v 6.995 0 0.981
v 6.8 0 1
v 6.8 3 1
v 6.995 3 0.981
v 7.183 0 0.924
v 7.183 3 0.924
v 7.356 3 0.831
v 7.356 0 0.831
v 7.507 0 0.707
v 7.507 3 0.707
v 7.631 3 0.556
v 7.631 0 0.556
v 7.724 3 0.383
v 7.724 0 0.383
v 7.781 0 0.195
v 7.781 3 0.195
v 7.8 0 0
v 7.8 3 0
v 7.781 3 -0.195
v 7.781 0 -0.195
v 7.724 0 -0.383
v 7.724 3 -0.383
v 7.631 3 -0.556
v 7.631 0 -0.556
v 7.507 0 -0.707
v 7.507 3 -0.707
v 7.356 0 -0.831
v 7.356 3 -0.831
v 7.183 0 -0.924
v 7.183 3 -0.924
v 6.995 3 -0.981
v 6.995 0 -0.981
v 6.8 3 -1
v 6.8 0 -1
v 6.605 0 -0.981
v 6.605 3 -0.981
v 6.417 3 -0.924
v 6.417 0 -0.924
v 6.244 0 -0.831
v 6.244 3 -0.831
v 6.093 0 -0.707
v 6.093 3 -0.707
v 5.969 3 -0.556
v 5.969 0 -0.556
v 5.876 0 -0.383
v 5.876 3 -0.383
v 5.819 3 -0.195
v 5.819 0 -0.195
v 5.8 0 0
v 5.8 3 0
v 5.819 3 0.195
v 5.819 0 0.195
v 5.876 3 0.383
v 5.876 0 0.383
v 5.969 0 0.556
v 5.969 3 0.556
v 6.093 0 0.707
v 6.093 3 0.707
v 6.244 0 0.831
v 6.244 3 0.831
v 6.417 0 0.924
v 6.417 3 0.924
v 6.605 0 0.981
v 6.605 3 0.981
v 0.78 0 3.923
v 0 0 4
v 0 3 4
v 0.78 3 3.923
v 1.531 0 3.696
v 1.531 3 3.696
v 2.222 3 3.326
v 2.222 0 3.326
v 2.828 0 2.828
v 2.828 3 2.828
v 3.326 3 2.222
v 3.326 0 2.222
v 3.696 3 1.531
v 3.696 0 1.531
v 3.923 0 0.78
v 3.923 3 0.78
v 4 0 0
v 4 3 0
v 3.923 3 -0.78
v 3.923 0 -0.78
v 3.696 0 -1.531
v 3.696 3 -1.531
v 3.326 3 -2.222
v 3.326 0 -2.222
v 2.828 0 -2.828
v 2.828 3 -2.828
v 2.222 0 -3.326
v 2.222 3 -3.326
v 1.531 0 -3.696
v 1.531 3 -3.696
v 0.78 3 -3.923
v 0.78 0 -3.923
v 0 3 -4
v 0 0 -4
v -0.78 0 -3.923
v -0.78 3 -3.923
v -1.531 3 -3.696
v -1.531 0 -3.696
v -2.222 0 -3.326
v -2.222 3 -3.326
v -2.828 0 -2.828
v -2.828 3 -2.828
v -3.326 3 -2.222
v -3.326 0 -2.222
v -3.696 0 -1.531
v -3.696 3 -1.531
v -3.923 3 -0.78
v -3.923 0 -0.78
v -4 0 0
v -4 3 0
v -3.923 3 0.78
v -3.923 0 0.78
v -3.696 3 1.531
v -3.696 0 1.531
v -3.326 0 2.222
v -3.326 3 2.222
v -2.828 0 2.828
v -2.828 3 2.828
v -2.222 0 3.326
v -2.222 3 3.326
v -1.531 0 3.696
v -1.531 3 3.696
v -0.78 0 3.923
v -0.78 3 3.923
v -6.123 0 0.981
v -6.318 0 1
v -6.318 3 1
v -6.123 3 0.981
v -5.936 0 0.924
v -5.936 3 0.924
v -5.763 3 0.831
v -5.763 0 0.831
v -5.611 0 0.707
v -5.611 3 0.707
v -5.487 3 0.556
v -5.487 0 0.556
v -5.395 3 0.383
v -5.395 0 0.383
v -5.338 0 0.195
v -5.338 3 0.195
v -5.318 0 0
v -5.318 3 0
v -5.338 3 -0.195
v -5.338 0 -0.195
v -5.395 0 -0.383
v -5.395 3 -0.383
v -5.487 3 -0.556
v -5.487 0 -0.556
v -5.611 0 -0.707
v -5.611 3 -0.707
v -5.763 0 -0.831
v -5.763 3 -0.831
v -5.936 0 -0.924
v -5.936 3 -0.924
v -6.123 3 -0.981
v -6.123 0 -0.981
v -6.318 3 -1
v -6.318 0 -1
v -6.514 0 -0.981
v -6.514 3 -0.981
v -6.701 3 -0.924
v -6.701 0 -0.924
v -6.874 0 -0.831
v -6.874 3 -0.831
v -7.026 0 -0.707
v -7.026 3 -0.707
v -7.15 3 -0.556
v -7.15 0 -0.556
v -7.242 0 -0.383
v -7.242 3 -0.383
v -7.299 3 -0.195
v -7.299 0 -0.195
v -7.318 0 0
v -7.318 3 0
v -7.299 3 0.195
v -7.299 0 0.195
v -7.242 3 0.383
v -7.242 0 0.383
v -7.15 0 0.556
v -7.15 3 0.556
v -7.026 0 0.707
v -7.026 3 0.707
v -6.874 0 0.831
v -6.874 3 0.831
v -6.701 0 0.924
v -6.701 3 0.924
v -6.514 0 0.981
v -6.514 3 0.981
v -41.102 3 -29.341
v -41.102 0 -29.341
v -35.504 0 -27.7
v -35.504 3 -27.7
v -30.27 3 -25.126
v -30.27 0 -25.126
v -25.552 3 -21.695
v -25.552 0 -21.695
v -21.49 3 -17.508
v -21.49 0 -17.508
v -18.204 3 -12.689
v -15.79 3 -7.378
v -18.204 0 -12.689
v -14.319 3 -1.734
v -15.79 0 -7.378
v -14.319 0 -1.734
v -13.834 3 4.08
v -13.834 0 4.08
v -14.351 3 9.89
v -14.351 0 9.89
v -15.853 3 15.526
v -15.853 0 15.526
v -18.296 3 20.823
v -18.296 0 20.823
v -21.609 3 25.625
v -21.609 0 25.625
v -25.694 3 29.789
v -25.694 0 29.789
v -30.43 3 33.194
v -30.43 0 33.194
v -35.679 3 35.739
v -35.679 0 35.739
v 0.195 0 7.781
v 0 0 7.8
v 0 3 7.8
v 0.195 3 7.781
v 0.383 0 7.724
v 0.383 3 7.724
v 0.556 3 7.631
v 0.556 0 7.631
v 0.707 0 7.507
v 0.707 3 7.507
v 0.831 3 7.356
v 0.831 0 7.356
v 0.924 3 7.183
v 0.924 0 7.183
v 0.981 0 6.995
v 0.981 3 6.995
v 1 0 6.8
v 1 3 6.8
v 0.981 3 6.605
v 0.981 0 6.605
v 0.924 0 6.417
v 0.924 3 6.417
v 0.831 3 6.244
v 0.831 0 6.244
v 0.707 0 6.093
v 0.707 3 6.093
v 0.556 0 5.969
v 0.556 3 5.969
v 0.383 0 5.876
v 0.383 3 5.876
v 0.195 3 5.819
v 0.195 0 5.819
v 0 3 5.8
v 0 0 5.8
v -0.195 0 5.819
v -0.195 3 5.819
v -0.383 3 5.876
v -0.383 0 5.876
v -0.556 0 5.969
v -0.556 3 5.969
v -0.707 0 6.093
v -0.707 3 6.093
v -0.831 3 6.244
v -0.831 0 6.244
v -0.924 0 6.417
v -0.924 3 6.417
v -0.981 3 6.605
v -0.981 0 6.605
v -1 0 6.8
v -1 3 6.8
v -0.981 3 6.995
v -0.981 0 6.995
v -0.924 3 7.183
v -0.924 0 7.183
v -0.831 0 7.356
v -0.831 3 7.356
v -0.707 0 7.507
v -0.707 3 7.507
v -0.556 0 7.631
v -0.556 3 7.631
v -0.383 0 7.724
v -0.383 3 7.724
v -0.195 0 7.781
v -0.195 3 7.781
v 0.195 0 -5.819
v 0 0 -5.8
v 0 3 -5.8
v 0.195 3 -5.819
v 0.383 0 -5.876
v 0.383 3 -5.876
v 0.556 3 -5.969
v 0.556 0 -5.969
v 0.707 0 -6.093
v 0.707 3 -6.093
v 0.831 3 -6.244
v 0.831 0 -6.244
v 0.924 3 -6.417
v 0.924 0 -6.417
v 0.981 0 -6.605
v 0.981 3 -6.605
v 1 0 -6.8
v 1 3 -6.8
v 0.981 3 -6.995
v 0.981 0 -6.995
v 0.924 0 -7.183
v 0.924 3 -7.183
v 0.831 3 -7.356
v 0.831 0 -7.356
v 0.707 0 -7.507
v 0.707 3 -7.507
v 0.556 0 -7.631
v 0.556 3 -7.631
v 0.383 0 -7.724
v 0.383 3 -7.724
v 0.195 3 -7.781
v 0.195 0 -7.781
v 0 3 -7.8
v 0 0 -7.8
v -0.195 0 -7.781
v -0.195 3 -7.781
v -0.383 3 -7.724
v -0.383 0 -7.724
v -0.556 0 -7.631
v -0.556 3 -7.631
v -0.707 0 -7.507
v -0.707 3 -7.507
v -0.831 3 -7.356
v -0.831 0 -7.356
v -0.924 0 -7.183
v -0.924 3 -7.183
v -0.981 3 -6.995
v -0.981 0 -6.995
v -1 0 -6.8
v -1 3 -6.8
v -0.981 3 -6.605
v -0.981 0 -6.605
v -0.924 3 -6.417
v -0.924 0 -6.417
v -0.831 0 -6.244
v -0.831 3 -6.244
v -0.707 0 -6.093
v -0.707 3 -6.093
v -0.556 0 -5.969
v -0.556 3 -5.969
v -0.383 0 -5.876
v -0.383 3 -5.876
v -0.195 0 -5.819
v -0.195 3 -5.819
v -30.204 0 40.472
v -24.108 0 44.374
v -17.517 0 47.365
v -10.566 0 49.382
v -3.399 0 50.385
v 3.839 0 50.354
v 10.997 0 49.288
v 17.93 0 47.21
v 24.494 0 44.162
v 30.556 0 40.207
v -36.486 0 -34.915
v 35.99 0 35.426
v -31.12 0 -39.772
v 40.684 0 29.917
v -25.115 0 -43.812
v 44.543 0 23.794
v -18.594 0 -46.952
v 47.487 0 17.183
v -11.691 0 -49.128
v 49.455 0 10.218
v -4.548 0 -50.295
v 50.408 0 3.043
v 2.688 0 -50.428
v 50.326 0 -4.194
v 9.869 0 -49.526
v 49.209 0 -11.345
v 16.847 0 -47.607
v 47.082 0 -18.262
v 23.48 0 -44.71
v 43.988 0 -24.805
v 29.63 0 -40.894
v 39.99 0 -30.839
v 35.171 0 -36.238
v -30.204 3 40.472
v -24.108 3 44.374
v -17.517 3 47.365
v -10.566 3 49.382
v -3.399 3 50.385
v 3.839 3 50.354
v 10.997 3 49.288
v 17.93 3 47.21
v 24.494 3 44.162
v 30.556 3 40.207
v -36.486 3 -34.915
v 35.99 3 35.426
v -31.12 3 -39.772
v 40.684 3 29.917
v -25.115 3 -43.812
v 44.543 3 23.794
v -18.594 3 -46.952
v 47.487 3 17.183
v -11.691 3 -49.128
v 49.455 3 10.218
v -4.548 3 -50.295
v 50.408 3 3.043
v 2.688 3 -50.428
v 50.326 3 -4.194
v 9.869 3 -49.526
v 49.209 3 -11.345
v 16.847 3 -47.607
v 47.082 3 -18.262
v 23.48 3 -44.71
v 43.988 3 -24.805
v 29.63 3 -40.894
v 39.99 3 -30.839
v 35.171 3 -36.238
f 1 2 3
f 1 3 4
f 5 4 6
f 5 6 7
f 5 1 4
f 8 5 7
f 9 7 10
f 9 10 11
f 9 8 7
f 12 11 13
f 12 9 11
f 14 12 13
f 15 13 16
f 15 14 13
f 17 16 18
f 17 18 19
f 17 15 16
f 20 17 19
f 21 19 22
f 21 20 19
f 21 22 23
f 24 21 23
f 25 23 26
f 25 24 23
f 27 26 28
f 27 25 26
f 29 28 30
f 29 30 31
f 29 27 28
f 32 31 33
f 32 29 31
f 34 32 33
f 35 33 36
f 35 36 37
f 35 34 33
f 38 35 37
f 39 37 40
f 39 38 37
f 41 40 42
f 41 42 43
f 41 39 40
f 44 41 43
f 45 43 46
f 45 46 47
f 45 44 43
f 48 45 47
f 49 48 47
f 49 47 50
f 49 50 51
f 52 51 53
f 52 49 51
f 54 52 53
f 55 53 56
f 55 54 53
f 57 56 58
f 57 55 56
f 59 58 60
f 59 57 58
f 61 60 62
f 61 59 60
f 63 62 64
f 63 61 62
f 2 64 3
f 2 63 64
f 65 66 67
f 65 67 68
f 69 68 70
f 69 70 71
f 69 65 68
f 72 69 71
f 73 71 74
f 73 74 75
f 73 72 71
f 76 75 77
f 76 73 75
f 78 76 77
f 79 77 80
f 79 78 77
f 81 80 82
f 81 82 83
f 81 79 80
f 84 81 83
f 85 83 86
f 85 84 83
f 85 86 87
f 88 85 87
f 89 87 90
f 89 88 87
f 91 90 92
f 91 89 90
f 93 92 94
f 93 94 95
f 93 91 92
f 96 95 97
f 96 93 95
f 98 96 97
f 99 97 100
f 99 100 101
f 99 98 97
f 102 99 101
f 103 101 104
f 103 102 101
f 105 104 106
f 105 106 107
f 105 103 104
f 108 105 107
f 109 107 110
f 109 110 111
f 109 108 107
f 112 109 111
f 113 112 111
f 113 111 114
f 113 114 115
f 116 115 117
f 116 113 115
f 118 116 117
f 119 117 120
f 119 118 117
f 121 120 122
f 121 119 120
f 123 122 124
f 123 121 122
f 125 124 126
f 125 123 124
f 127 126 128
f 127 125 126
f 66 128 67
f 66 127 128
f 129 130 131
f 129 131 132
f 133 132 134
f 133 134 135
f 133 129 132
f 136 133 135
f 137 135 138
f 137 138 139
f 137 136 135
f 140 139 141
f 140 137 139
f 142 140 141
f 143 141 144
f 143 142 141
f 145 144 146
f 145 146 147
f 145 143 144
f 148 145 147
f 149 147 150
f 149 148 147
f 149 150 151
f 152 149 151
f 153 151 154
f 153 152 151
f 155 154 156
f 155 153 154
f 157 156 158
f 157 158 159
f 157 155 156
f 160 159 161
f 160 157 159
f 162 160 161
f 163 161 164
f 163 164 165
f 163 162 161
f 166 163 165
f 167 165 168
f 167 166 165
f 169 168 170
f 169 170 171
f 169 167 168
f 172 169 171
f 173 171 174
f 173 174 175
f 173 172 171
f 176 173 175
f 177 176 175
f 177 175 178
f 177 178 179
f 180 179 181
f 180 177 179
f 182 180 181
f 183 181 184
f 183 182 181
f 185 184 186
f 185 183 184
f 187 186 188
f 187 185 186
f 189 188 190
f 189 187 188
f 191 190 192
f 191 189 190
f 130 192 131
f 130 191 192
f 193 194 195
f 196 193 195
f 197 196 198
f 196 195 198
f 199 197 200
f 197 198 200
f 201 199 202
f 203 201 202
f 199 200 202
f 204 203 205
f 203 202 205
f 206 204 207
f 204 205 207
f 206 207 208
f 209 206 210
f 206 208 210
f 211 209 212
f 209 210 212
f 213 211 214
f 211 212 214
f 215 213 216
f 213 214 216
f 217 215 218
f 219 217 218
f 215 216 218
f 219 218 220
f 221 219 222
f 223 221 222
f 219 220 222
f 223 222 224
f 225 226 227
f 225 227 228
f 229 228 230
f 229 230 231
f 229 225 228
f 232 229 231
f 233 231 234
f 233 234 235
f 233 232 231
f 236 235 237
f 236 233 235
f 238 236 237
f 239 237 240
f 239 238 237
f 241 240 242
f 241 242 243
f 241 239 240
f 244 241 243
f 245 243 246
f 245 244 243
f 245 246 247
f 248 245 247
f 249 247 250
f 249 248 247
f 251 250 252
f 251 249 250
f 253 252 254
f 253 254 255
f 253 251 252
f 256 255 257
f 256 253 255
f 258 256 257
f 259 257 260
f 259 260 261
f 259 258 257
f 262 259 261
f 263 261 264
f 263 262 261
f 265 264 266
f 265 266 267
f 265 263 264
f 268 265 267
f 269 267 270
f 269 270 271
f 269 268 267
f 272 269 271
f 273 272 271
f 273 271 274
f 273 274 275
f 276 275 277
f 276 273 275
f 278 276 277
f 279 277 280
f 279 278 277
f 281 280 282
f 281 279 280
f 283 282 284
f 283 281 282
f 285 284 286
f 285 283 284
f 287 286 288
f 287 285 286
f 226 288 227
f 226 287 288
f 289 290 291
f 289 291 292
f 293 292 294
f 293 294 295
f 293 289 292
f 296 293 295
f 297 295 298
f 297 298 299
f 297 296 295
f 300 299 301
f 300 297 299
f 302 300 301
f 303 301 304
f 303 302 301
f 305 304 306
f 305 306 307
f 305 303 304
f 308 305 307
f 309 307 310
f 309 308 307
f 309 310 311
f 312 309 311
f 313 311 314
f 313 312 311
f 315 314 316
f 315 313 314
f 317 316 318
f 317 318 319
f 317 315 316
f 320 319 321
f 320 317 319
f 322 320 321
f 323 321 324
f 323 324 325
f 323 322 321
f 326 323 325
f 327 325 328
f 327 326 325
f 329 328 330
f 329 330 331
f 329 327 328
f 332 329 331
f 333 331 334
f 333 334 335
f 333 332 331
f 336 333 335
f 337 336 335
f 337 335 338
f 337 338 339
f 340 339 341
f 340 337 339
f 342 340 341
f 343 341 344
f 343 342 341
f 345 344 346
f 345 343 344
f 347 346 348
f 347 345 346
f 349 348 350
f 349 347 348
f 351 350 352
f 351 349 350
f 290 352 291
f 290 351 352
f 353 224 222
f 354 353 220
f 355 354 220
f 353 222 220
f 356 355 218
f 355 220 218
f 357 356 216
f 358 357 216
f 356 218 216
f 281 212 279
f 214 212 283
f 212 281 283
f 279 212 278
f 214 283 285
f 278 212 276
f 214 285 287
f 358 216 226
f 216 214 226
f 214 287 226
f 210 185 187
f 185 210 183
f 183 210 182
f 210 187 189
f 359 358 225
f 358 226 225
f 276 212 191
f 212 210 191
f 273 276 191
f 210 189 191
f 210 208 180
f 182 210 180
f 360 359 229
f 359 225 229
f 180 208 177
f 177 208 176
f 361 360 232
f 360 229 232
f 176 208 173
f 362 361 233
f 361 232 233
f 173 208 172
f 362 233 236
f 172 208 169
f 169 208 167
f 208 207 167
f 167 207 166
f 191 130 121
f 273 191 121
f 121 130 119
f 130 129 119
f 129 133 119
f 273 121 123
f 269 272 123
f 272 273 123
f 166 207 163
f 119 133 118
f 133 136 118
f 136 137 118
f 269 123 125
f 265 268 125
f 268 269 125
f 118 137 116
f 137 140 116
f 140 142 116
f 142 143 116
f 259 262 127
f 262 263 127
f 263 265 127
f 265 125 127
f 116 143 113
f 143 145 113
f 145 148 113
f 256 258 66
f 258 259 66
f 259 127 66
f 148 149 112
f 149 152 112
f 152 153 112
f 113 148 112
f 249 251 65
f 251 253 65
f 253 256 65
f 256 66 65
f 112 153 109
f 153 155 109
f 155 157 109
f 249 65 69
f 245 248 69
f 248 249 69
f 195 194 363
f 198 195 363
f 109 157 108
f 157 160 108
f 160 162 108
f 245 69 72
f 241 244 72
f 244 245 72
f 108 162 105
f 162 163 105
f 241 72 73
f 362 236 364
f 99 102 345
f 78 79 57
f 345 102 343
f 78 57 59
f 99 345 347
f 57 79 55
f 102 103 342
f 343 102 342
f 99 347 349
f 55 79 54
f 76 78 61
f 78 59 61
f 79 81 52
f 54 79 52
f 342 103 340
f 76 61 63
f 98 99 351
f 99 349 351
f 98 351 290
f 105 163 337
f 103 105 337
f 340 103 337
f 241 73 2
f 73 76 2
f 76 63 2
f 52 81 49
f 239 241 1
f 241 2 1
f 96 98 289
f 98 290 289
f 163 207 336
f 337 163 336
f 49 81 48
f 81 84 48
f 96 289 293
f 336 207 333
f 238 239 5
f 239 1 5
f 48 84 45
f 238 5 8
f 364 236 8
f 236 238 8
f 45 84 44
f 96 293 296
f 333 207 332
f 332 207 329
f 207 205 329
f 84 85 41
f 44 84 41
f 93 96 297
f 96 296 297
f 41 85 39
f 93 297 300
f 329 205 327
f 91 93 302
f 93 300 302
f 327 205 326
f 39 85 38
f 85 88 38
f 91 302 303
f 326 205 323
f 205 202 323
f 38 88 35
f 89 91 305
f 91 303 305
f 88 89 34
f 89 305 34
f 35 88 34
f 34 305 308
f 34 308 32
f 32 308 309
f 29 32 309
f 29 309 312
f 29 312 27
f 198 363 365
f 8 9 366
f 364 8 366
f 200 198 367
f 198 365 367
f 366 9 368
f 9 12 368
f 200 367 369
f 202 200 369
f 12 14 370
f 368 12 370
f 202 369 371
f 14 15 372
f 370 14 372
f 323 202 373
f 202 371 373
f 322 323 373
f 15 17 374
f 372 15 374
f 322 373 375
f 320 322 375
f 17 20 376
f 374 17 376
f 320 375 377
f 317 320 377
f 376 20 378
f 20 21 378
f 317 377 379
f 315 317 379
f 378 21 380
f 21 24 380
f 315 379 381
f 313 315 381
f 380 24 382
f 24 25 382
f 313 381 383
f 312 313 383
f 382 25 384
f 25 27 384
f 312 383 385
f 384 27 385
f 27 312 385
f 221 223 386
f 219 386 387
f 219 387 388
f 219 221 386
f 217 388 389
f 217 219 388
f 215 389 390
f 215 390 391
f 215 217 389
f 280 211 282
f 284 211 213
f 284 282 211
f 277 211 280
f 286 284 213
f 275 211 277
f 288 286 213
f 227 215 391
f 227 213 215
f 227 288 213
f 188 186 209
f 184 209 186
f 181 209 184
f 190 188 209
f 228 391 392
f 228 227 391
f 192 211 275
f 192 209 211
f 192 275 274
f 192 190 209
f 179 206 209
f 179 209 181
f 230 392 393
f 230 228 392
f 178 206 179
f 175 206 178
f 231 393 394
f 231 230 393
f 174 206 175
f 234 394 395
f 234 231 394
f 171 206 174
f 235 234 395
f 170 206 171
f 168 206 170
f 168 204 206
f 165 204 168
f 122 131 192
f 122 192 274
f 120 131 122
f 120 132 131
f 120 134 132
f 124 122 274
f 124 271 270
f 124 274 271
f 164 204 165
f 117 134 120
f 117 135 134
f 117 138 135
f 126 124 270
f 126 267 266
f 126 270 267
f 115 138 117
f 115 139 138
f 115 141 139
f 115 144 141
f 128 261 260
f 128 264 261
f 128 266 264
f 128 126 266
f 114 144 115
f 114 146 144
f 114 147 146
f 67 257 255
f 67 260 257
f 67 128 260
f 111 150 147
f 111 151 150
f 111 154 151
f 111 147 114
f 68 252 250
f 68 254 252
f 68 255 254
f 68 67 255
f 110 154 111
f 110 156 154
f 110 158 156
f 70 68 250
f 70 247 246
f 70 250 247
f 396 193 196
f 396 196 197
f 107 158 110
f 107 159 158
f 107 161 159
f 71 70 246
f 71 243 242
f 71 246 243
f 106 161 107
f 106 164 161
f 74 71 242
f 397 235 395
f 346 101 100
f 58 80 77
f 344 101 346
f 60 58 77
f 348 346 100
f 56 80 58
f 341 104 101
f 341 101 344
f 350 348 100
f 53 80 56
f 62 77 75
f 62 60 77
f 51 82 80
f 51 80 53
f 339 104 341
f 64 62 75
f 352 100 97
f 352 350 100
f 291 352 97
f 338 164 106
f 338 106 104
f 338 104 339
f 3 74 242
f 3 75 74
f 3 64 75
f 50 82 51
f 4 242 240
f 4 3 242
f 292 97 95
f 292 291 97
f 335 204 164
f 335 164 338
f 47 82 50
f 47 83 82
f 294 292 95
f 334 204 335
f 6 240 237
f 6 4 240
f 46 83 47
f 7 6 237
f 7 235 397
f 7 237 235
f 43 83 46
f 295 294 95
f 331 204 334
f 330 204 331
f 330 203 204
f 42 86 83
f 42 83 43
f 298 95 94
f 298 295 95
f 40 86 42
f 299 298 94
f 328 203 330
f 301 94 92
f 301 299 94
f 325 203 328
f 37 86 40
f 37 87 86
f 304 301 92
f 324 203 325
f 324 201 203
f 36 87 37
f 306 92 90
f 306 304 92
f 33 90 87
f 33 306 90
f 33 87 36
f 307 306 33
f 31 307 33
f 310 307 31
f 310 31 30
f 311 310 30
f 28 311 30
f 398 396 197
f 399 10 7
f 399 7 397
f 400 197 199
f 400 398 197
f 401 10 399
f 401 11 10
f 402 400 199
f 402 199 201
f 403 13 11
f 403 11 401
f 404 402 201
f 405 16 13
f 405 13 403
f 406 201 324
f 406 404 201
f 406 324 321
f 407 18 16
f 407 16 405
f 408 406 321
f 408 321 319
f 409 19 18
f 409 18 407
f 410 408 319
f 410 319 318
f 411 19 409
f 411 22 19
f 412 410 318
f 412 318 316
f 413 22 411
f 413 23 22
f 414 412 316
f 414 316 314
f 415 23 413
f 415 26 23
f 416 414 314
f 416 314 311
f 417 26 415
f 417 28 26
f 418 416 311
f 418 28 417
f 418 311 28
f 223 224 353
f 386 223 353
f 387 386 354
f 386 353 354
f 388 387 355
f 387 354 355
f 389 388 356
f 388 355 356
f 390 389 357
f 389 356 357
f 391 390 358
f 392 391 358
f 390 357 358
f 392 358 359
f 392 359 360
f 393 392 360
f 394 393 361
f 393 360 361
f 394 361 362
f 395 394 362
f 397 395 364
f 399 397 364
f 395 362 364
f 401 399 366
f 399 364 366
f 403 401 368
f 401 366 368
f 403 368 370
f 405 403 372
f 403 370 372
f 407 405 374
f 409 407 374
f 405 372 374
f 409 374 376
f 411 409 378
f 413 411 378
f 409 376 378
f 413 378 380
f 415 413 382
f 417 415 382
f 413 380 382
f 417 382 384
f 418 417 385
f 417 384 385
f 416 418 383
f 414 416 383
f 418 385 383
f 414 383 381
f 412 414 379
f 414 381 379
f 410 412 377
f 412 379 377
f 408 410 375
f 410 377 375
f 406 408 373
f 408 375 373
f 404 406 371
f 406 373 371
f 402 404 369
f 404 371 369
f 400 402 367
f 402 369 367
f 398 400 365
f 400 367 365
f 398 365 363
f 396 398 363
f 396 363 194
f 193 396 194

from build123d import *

# Parameters (mm, degrees)
SKETCH1_R           = 4
SKETCH1_R_2         = 1
BOSS_EXTRUDE1_DEPTH = 3


with BuildPart() as part:
    # Sketch1 → Boss-Extrude1 (new body)
    with BuildSketch(Plane(origin=(0, 0, 0), x_dir=(1, 0, 0), z_dir=(0, 1, 0))):
        with BuildLine():
            ThreePointArc((-35.678871137, -35.738888545), (50.325579201, 4.193575813), (-41.101893418, 29.340830893))
            ThreePointArc((-41.101893418, 29.340830893), (-13.951645719, -1.162575473), (-35.678871137, -35.738888545))
        make_face()
        with Locations(Location((0, 0, 0), (0, 0, 270))):
            Circle(SKETCH1_R, mode=Mode.SUBTRACT)
        with Locations(Location((-6.318484242, 0, 0), (0, 0, 270))):
            Circle(SKETCH1_R_2, mode=Mode.SUBTRACT)
        with Locations(Location((0, 6.8, 0), (0, 0, 270))):
            Circle(SKETCH1_R_2, mode=Mode.SUBTRACT)
        with Locations(Location((6.8, 0, 0), (0, 0, 270))):
            Circle(SKETCH1_R_2, mode=Mode.SUBTRACT)
        with Locations(Location((0, -6.8, 0), (0, 0, 270))):
            Circle(SKETCH1_R_2, mode=Mode.SUBTRACT)
    extrude(amount=BOSS_EXTRUDE1_DEPTH)


solid = part.part
